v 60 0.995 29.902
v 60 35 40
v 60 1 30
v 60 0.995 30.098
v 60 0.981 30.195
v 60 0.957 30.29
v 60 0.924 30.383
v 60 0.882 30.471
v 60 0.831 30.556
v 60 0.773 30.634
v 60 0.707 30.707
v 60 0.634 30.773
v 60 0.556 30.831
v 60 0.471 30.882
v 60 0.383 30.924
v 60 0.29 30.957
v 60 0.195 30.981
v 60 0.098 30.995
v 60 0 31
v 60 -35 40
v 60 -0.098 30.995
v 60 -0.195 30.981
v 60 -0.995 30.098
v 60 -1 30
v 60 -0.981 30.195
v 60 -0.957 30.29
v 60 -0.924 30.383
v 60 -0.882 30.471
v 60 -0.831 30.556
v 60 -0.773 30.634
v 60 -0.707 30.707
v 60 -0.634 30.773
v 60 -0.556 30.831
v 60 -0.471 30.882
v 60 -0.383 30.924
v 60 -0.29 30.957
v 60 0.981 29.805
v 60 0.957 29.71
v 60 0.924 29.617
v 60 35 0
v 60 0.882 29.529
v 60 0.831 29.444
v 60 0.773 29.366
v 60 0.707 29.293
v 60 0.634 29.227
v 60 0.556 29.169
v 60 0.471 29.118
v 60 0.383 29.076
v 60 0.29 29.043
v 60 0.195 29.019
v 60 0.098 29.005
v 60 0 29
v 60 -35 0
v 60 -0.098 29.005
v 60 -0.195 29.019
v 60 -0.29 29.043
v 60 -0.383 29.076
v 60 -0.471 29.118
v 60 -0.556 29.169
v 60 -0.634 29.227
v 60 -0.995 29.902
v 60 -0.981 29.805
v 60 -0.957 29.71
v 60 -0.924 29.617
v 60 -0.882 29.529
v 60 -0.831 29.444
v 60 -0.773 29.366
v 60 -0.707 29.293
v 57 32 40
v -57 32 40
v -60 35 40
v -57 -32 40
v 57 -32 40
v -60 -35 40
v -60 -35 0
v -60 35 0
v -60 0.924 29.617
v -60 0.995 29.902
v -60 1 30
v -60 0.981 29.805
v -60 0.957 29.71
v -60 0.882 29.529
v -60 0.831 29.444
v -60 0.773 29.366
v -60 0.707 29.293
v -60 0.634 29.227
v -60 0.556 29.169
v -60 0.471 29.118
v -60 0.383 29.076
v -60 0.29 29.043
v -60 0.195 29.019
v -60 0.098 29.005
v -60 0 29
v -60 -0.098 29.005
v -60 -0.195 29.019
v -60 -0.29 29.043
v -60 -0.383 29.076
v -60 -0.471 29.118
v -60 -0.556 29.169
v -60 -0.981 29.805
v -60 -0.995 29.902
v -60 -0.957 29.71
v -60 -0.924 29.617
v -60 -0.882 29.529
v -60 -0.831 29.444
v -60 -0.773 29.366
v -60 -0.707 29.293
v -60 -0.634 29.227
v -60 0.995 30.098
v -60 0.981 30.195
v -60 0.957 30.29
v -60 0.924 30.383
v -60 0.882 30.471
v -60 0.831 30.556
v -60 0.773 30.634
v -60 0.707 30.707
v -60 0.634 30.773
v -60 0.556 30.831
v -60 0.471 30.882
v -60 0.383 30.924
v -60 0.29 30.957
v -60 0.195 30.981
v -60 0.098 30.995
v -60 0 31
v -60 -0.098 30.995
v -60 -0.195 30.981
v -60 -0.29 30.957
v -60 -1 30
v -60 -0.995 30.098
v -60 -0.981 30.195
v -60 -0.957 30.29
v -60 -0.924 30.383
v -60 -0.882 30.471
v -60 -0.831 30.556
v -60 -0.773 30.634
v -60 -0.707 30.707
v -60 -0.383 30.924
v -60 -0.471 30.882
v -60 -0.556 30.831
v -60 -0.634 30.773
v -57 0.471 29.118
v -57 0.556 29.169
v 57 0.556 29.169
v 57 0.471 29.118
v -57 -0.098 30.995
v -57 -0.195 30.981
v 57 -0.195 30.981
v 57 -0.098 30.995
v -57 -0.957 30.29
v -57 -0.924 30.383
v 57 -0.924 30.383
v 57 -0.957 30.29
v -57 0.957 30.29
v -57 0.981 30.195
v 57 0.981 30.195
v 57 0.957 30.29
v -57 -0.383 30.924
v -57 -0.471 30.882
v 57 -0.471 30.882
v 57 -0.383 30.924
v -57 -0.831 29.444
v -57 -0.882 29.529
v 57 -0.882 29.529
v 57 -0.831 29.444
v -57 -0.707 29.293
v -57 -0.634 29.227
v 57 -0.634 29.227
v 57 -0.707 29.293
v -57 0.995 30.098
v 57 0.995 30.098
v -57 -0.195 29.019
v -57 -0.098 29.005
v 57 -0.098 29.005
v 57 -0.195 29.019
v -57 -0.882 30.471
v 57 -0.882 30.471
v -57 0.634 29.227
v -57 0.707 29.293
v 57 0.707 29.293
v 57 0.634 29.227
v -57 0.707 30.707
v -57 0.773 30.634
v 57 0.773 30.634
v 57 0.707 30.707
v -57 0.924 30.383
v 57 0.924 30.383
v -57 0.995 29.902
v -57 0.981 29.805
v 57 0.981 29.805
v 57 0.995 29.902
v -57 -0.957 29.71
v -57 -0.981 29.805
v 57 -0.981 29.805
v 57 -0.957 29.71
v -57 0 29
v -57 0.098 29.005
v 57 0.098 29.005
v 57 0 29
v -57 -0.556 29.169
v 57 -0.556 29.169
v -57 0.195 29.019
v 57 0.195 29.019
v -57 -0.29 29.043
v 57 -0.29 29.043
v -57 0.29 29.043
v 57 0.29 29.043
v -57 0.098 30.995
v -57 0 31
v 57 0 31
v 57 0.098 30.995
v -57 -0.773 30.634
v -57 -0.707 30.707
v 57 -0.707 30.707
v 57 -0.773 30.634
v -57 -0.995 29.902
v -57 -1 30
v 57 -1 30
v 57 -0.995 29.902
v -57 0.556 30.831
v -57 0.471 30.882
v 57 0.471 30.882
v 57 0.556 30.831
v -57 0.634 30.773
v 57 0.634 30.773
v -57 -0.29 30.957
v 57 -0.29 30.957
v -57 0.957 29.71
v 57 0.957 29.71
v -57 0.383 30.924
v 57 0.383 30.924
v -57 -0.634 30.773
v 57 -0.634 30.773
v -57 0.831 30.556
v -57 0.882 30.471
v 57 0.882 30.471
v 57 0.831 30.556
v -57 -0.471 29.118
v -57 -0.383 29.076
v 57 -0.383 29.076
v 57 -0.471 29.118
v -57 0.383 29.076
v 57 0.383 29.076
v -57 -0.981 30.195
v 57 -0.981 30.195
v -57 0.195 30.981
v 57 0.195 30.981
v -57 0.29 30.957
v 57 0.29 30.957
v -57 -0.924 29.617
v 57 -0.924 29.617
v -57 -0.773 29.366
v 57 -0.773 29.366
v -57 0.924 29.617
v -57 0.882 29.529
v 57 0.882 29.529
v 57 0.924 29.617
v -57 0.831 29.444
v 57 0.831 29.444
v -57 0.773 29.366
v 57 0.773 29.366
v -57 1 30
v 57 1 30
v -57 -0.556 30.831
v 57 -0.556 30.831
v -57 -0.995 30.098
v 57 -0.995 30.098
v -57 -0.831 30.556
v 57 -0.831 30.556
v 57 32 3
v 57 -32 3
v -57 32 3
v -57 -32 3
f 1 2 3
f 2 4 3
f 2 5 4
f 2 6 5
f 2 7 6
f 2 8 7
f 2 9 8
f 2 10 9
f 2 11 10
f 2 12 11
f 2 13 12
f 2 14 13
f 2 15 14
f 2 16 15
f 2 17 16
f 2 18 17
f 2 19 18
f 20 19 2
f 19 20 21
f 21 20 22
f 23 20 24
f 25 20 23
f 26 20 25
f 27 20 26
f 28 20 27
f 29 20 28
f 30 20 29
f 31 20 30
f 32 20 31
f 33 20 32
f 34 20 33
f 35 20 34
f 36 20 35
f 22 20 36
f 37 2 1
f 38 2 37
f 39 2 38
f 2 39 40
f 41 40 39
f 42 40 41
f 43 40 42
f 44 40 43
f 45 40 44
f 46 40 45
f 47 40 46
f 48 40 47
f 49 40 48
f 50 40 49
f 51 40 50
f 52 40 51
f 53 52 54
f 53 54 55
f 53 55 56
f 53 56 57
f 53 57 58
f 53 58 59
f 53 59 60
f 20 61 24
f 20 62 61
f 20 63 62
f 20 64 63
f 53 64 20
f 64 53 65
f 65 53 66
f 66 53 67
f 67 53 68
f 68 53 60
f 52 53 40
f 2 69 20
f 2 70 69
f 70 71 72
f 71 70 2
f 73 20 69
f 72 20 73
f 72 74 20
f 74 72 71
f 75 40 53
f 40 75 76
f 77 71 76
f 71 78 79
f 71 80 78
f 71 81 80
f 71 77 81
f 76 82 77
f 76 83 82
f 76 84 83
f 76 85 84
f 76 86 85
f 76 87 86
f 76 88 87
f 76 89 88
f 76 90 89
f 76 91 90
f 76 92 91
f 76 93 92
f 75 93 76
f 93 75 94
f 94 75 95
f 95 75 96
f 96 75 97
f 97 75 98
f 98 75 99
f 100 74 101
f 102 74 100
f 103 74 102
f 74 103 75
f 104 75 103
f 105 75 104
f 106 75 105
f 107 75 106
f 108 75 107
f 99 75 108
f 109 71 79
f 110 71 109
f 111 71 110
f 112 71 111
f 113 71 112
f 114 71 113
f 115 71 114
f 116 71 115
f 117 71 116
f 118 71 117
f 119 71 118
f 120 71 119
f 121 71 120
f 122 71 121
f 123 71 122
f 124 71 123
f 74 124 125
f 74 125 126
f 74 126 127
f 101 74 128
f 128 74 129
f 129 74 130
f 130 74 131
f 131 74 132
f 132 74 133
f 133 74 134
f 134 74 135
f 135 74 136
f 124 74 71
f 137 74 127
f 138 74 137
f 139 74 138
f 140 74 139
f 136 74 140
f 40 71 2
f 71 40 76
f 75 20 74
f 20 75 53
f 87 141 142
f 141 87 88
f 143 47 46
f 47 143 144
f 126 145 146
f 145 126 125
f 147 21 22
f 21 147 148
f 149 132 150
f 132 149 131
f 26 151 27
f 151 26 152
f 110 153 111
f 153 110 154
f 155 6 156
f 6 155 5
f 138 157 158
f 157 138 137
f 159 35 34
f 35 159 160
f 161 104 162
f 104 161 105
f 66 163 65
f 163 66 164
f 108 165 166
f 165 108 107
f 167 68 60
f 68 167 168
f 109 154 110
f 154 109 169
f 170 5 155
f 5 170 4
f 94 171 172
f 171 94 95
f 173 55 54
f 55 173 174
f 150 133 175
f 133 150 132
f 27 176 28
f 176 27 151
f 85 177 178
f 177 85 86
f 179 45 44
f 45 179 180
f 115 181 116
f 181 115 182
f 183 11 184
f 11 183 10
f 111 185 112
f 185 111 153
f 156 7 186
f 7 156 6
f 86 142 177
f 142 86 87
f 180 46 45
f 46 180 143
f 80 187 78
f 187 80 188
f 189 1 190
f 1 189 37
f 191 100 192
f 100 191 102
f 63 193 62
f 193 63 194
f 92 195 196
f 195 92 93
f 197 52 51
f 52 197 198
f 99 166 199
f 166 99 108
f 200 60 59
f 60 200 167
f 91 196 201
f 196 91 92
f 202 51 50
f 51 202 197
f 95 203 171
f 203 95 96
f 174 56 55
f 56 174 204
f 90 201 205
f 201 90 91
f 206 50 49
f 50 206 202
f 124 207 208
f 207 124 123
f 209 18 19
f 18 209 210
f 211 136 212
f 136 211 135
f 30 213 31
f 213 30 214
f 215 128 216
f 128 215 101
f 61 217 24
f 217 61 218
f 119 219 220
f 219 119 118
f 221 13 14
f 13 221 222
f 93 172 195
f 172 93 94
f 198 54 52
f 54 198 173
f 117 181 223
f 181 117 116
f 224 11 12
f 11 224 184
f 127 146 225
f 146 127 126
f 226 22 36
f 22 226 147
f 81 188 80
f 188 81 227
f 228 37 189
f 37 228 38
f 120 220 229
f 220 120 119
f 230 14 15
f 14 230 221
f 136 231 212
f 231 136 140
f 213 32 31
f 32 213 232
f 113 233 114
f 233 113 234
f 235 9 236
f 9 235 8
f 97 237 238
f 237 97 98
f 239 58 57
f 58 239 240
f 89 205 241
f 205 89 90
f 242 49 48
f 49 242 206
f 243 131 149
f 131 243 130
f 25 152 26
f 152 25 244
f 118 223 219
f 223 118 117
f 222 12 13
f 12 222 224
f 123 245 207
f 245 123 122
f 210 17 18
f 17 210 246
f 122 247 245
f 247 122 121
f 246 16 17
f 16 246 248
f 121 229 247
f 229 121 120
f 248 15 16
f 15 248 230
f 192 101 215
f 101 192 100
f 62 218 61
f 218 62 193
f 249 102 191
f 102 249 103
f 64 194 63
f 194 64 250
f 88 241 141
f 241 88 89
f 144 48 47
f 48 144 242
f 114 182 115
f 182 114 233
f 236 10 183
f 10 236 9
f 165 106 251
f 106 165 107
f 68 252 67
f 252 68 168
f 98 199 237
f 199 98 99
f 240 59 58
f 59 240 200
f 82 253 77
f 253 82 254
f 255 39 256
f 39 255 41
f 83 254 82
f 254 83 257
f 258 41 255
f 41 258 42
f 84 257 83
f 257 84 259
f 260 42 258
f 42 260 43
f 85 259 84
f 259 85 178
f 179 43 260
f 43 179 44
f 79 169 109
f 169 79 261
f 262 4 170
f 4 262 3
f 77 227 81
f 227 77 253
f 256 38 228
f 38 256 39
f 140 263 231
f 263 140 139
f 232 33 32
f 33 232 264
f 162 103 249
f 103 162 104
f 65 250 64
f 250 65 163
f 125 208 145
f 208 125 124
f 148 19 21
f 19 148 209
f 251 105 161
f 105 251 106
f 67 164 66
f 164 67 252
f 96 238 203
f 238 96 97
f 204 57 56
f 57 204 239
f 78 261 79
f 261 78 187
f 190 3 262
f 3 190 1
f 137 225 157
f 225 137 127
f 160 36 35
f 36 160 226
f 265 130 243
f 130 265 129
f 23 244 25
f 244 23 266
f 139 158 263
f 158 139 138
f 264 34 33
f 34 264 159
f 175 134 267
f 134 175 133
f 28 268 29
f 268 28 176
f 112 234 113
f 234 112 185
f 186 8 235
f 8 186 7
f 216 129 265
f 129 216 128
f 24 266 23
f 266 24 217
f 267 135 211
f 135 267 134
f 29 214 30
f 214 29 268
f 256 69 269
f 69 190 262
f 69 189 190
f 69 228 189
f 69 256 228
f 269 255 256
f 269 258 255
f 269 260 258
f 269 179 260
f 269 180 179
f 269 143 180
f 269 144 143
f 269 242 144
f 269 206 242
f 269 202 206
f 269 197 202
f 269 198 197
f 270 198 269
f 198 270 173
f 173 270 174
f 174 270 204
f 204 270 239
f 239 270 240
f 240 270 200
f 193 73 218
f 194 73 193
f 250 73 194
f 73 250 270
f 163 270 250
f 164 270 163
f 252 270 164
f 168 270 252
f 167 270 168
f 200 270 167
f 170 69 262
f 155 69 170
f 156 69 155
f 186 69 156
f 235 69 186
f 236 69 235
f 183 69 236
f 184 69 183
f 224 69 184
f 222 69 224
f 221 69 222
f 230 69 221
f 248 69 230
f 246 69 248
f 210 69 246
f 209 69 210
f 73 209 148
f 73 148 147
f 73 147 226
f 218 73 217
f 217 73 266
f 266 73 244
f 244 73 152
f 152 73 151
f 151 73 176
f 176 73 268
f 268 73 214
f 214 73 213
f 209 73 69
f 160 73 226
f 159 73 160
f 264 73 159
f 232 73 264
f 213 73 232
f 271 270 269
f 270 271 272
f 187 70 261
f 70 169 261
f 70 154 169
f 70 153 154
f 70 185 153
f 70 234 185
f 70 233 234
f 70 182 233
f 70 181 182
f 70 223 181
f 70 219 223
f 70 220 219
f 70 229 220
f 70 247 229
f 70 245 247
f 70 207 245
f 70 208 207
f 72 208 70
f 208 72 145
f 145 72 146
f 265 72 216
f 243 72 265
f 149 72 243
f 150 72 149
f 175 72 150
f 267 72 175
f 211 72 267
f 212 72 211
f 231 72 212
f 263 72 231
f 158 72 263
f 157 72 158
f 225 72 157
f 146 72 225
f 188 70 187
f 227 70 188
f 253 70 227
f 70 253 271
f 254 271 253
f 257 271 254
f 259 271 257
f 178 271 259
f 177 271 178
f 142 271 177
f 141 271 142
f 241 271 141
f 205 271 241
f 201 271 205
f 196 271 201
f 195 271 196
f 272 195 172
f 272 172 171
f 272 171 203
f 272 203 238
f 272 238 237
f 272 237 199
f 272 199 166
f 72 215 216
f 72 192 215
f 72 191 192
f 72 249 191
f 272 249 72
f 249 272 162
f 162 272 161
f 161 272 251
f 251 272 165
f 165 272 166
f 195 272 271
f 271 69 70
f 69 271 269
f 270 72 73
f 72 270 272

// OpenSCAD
// --- Dimensions (mm) ---
outer_x = 120;          // Total length of the tank
outer_y = 70;           // Total width of the tank
outer_z = 40;           // Total height of the tank

wall_thickness = 3;     // Thickness of the walls and floor
floor_thickness = 3;    // Thickness of the floor

platform_length = 60;   // Length of the central platform (X direction)
platform_height = 13;   // Height of the platform top from the inner floor
platform_width = outer_y - (2 * wall_thickness); // Spans full inner width

hole_diameter = 2;      // Diameter of electrode wire holes
hole_y_pos = 0;         // Y position of holes (centered on Y axis)
hole_z_pos = 30;        // Z position of holes (measured from the bottom of the tank)

// --- Resolution ---
$fn = 64;

// --- Model Construction ---

// The part is built starting from Z=0 to ensure it rests on the XY plane.
// We use a union of the shell and platform, then subtract the cavity and holes.

module tank_geometry() {
    difference() {
        // 1. The Solid Body (Outer shell + Internal Platform)
        union() {
            // The main outer block (Base at Z=0)
            cube([outer_x, outer_y, outer_z]);

            // The Platform
            // The platform is centered in X.
            // Its top is at: floor_thickness + platform_height
            // Its bottom is at: floor_thickness
            // Its height is: platform_height
            // To center it in Y: (outer_y - platform_width) / 2
            translate([
                (outer_x - platform_length) / 2, 
                (outer_y - platform_width) / 2, 
                floor_thickness
            ])
            cube([platform_length, platform_width, platform_height]);
        }

        // 2. The Inner Cavity (The space where buffer goes)
        // We subtract the void from the floor_thickness up to the top.
        // We extend the subtraction slightly to ensure the top is open.
        translate([wall_thickness, wall_thickness, floor_thickness])
            cube([outer_x - 2*wall_thickness, outer_y - 2*wall_thickness, outer_z + 0.1]);

        // 3. The Electrode Holes
        // The user specified holes through the X-end walls at y=0, z=30.
        // In our coordinate system (0,0,0 is a corner), the center of the tank is at Y = outer_y/2.
        // The user's "y=0" refers to the center of the Y-axis of the tank.
        // Therefore, the hole is at Y = outer_y / 2.
        // The hole is at Z = 30.
        // We drill through the X-axis (the length of the tank).
        
        // We use a single long cylinder to ensure it cuts through the entire X-span.
        // We use a loop to ensure it cuts through both end walls.
        for (x_offset = [-1, outer_x]) {
            translate([x_offset, outer_y/2, hole_z_pos])
                rotate([0, 90, 0])
                    cylinder(d = hole_diameter, h = outer_x + 2, center = true);
        }
    }
}

// Final Assembly:
// The geometry is built from (0,0,0) as the corner.
// To center it on the X and Y axes as per the prompt:
translate([-outer_x/2, -outer_y/2, 0])
    tank_geometry();

// --- Verification of logic ---
// 1. Dimensions: 120x70x40. Correct.
// 2. Walls/Floor: 3mm. Correct.
// 3. Platform: 60mm long, spans full inner width, top is 13mm above inner floor. Correct.
// 4. Holes: 2mm diameter, at Y=0 (tank center), Z=30 (from bottom). Correct.
// 5. Orientation: Rests on XY plane at Z=0. Correct.
